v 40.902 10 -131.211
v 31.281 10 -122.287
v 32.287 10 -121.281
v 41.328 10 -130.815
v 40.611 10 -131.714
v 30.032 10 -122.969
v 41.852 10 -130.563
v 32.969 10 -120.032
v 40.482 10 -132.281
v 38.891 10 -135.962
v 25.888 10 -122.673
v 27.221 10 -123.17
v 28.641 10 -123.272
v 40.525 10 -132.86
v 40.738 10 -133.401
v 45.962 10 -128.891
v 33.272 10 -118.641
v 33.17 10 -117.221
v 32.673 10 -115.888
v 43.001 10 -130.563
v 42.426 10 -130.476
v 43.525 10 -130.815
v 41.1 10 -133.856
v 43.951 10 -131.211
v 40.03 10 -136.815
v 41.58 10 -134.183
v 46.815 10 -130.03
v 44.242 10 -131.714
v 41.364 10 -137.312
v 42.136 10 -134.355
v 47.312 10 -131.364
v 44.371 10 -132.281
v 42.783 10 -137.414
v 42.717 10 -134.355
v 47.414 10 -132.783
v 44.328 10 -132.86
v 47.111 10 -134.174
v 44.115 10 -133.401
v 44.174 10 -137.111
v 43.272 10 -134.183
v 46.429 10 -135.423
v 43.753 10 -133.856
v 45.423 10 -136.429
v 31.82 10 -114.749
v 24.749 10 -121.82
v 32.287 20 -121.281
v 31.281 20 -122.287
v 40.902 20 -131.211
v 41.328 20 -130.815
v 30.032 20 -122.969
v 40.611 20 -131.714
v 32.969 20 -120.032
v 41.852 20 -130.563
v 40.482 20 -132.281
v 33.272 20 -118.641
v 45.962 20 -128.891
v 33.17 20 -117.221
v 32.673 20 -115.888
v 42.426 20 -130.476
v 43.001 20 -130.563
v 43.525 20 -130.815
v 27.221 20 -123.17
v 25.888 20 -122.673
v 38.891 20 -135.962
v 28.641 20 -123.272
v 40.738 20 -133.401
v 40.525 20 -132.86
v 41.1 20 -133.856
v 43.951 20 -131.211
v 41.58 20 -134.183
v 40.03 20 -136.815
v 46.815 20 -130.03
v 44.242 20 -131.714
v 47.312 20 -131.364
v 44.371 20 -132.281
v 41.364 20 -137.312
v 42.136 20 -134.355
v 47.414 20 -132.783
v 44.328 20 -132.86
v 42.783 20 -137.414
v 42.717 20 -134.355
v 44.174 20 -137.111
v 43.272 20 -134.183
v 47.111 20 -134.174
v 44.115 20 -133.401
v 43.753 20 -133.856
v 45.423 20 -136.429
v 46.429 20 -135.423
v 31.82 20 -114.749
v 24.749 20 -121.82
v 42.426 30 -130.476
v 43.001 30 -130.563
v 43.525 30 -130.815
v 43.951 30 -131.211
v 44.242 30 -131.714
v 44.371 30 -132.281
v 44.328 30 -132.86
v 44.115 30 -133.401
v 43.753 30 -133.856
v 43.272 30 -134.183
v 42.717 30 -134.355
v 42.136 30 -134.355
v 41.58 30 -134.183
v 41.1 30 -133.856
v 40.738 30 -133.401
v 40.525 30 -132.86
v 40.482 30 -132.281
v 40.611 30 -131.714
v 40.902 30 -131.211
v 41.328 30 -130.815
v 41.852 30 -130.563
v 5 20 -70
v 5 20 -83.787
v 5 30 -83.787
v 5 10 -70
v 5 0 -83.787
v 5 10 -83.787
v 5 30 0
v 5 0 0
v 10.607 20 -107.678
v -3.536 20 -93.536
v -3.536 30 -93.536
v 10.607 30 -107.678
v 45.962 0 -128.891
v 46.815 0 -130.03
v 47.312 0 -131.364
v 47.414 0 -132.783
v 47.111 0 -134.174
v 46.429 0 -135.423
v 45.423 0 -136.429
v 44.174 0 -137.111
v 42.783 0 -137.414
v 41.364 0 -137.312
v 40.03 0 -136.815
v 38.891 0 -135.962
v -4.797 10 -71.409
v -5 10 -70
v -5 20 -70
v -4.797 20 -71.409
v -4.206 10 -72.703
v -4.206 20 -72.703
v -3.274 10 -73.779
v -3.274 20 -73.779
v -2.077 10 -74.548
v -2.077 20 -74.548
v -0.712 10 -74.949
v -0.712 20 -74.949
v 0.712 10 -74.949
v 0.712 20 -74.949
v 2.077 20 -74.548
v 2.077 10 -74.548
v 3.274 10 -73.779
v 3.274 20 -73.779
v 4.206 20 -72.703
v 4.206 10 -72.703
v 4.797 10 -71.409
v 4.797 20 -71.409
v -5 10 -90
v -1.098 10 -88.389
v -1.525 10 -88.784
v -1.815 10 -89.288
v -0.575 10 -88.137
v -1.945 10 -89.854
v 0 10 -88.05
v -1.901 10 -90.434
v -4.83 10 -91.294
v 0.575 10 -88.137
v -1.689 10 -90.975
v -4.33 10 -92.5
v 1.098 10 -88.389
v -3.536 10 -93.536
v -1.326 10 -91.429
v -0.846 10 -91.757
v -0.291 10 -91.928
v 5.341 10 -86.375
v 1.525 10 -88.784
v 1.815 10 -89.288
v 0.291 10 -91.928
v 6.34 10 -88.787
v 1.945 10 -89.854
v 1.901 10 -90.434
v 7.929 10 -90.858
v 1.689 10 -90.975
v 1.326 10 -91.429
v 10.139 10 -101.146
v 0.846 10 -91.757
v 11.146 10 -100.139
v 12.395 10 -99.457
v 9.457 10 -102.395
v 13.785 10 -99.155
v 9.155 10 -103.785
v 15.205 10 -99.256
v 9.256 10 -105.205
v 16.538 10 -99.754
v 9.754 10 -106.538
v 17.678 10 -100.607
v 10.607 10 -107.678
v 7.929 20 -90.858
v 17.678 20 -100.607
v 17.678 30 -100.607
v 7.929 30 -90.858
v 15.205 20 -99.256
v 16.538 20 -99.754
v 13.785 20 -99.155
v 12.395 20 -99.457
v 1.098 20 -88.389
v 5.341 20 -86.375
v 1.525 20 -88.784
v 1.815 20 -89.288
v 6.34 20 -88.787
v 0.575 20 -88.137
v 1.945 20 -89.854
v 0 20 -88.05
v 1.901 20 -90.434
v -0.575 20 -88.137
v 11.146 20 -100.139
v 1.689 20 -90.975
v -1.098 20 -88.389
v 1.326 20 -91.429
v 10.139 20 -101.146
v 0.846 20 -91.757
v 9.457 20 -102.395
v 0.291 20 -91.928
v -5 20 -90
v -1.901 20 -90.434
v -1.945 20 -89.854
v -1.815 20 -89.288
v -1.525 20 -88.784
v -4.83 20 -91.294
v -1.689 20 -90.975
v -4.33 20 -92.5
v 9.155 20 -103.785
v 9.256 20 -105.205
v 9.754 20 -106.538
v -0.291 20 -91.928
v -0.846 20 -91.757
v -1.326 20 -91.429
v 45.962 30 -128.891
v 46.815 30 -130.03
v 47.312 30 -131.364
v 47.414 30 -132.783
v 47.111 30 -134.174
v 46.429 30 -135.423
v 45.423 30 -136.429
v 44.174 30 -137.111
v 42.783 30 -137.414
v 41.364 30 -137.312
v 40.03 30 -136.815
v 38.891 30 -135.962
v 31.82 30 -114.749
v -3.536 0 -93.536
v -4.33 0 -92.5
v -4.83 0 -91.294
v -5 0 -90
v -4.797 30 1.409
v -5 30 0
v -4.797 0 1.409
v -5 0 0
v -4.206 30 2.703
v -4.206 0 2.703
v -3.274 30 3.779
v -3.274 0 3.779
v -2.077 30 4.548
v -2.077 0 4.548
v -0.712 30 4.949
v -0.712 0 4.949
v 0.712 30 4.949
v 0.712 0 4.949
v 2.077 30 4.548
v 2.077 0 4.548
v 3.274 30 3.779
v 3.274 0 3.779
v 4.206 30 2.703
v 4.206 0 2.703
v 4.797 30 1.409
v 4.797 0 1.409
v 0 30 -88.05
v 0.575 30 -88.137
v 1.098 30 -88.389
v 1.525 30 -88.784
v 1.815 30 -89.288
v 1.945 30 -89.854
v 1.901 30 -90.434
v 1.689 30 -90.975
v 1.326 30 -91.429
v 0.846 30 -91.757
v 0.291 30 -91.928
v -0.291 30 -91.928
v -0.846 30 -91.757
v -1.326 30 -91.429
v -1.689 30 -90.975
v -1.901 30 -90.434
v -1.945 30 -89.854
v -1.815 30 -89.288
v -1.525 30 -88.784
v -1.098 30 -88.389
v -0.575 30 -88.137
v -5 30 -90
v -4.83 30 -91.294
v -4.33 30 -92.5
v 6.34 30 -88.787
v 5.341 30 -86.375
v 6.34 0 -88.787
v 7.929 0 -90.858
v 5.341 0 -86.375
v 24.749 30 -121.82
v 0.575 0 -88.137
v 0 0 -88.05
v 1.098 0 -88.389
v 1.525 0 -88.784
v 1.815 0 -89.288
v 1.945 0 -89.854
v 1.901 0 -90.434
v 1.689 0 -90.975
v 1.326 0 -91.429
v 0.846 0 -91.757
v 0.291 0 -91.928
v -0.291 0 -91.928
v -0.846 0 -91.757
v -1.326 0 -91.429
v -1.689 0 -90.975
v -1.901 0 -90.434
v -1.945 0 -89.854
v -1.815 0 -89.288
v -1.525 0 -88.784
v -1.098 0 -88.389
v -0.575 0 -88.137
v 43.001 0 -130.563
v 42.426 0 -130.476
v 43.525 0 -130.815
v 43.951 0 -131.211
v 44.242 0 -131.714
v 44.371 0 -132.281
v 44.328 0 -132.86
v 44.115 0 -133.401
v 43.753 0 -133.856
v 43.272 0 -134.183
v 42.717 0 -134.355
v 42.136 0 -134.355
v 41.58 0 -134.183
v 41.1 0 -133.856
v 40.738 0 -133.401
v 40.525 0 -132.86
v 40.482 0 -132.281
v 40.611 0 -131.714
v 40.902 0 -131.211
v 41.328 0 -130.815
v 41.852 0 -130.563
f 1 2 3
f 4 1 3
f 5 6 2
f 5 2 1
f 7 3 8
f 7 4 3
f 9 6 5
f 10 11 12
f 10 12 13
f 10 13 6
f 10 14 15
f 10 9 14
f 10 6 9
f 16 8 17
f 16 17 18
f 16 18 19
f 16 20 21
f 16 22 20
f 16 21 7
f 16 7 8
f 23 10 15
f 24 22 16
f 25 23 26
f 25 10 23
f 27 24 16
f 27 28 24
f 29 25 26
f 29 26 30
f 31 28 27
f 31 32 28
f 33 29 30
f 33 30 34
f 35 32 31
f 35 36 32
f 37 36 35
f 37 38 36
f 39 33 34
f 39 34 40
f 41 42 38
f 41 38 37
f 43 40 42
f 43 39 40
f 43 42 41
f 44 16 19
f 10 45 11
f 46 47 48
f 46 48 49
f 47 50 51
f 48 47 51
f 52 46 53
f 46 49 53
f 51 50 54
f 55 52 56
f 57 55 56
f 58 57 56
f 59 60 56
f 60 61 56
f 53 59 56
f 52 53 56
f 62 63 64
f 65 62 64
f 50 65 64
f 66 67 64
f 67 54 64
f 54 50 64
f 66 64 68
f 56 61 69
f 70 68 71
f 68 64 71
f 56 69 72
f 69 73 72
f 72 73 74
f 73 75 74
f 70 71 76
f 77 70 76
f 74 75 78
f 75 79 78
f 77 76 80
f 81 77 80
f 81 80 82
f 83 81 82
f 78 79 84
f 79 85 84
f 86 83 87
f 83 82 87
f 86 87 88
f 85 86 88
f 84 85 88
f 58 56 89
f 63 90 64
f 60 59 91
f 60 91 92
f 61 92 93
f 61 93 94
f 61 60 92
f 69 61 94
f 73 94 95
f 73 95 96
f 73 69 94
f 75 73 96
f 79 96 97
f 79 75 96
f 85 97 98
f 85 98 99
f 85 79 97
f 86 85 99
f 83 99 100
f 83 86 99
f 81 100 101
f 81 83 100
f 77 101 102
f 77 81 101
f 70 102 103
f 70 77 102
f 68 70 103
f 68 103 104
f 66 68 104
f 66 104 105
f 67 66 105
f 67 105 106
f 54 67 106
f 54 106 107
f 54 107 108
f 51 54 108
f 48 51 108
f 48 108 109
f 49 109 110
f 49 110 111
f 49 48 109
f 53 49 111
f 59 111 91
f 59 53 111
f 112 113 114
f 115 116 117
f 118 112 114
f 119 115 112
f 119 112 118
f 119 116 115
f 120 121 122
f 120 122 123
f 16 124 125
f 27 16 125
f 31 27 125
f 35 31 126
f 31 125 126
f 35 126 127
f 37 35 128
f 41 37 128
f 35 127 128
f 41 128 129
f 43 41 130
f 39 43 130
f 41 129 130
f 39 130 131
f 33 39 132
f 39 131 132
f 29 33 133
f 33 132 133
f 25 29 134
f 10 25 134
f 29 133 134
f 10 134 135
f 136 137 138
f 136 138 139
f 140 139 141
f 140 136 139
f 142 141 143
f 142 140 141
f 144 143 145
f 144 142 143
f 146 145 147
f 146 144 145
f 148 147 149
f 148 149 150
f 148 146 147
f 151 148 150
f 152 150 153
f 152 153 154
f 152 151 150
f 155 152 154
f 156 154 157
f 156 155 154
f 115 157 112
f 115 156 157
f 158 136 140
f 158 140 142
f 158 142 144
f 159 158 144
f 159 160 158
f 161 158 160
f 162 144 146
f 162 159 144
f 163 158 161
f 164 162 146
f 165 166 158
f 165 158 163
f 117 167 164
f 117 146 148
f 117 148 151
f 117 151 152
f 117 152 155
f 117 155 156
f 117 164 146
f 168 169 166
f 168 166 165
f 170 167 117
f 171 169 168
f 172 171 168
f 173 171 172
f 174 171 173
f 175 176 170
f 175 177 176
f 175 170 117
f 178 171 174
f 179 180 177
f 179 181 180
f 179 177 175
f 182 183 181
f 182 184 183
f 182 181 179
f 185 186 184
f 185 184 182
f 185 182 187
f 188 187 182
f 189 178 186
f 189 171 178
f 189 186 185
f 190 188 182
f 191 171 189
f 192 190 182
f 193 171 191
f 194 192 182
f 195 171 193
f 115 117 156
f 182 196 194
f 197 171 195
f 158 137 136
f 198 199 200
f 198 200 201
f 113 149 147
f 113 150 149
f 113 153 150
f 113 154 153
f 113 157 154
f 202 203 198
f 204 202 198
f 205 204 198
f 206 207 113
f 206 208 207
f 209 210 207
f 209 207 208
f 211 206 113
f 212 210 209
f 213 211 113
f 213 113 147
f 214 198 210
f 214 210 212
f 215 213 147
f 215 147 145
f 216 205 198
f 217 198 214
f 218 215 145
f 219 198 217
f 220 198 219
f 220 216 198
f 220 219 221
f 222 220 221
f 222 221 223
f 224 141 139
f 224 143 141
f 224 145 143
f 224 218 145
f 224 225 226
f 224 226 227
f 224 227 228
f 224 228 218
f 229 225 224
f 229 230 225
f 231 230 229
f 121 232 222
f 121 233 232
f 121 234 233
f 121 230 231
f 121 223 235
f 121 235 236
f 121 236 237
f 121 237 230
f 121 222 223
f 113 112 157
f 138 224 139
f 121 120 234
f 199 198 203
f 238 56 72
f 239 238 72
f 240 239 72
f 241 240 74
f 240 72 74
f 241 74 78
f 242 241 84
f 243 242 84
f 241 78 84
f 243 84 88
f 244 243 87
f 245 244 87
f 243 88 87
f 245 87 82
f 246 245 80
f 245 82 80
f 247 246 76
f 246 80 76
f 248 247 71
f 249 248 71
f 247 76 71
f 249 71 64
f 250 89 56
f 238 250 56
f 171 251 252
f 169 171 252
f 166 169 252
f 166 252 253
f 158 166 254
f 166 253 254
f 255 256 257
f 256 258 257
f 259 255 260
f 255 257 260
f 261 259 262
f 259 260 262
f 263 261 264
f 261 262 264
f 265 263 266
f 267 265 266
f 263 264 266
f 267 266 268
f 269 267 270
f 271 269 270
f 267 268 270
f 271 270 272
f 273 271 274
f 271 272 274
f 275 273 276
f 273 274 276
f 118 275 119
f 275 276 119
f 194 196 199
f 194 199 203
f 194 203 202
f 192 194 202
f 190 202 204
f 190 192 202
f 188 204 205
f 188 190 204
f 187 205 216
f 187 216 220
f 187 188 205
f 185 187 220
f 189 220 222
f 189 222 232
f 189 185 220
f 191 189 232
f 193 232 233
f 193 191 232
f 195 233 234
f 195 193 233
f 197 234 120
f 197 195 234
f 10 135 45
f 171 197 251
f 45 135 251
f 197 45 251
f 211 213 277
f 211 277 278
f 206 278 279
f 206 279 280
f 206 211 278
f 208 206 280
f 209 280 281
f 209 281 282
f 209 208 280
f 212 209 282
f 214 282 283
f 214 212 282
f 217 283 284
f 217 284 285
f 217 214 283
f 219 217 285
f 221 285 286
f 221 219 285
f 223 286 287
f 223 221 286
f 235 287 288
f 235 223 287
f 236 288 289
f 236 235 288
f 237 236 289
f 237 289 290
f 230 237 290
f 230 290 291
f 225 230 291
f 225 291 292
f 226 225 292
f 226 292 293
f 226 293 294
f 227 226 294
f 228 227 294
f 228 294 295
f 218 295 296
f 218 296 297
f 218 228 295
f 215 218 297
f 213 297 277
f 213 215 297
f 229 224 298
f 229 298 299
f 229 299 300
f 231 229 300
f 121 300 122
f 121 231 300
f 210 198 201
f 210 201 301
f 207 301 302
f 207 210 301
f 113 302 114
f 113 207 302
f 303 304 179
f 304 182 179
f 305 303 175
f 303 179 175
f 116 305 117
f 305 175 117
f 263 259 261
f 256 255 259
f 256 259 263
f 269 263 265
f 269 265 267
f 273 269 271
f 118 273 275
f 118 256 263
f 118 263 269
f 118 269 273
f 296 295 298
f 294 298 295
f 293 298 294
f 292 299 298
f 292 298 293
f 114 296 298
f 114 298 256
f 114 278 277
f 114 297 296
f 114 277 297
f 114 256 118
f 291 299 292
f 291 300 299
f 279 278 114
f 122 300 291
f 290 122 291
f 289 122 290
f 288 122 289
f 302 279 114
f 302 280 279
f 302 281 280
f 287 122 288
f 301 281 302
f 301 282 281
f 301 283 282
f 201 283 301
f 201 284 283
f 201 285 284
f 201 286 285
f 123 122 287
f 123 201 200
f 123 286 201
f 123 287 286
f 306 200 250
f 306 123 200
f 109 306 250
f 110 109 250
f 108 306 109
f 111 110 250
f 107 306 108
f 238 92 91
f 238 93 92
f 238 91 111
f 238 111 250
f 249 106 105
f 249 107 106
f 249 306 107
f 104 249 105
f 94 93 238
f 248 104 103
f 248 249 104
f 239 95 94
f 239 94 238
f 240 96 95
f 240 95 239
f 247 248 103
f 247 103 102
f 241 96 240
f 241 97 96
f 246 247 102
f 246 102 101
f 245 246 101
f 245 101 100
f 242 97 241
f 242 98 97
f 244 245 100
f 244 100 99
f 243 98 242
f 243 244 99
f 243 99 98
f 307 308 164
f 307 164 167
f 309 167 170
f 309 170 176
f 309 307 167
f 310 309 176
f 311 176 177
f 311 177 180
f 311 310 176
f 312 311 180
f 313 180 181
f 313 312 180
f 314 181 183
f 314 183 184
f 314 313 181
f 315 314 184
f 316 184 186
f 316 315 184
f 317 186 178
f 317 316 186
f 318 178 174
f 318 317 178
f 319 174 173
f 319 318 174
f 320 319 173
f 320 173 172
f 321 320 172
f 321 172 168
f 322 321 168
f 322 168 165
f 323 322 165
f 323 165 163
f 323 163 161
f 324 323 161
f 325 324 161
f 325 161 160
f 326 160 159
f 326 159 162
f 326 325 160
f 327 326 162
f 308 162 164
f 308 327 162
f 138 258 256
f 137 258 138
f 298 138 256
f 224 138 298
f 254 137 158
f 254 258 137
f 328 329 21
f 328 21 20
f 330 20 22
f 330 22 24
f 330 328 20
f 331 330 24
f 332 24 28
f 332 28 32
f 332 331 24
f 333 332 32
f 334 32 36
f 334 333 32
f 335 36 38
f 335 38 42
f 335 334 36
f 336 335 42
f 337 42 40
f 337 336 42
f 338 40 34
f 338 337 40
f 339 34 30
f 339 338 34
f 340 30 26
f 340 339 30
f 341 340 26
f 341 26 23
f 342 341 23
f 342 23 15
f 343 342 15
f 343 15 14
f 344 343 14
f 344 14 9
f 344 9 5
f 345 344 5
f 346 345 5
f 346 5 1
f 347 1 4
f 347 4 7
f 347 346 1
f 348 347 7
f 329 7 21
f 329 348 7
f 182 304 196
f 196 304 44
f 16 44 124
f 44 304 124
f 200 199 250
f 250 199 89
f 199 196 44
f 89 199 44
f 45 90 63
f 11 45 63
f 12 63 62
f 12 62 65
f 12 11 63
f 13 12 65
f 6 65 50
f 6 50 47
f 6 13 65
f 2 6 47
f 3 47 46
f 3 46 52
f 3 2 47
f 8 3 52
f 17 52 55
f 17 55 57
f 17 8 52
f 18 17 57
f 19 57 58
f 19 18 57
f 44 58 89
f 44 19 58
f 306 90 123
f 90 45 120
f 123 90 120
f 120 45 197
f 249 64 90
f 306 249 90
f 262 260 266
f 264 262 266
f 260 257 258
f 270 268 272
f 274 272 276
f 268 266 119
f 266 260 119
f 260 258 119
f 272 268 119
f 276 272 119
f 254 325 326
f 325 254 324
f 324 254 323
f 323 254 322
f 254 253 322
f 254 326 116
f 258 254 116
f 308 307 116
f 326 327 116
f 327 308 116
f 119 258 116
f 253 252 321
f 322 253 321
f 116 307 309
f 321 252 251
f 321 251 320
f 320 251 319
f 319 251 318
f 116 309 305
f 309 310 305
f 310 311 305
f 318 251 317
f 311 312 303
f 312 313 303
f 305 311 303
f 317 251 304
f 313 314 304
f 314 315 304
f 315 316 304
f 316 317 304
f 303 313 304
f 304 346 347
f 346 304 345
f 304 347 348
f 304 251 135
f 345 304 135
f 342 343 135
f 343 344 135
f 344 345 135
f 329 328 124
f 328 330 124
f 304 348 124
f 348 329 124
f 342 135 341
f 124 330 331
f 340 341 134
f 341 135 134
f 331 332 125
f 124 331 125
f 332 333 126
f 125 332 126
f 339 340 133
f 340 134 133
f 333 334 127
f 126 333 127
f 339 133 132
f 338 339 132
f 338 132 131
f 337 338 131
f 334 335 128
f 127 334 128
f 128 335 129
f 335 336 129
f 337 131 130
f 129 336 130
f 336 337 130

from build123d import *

# Parameters (mm, degrees)
ESQUISSE2_R        = 1.95
BOSS_EXTRU_1_DEPTH = 10
CONG_1_R           = 10
BOSS_EXTRU_2_DEPTH = 10
ESQUISSE4_R        = 1.95
BOSS_EXTRU_3_DEPTH = 10


with BuildPart() as part:
    # Esquisse2 → Boss.-Extru.1 (new body)
    # profile 1 of 3: a face of its own
    with BuildSketch(Plane(origin=(0, 0, 0), x_dir=(1, 0, 0), z_dir=(0, 1, 0))):
        with BuildLine():
            Line((-5, 90), (-5, 0))
            ThreePointArc((-5, 0), (0, -5), (5, 0))
            Line((5, 0), (5, 87.928932188))
            Line((5, 87.928932188), (3.535533906, 86.464466094))
            ThreePointArc((3.535533906, 86.464466094), (-1.913417162, 85.380602337), (-5, 90))
        make_face()
    # profile 2 of 3: a face of its own
    with BuildSketch(Plane(origin=(0, 0, 0), x_dir=(1, 0, 0), z_dir=(0, 1, 0))):
        with BuildLine():
            Line((38.890872965, 135.961940777), (-3.535533906, 93.535533906))
            ThreePointArc((-3.535533906, 93.535533906), (1.913417162, 94.619397663), (5, 90))
            Line((5, 90), (5, 87.928932188))
            Line((5, 87.928932188), (45.961940777, 128.890872965))
            ThreePointArc((45.961940777, 128.890872965), (45.961940777, 135.961940777), (38.890872965, 135.961940777))
        make_face()
        with Locations(Location((42.426406871, 132.426406871, 0), (0, 0, 270))):
            Circle(ESQUISSE2_R, mode=Mode.SUBTRACT)
    # profile 3 of 3: a face of its own
    with BuildSketch(Plane(origin=(0, 0, 0), x_dir=(1, 0, 0), z_dir=(0, 1, 0))):
        with BuildLine():
            ThreePointArc((-3.535533906, 93.535533906), (-4.619397663, 91.913417162), (-5, 90))
            ThreePointArc((-5, 90), (-1.913417162, 85.380602337), (3.535533906, 86.464466094))
            Line((3.535533906, 86.464466094), (5, 87.928932188))
            Line((5, 87.928932188), (5, 90))
            ThreePointArc((5, 90), (1.913417162, 94.619397663), (-3.535533906, 93.535533906))
        make_face()
        with Locations(Location((0, 90, 0), (0, 0, 270))):
            Circle(ESQUISSE2_R, mode=Mode.SUBTRACT)
    extrude(amount=BOSS_EXTRU_1_DEPTH)

    # Congé1
    cong_1_edges = [part.edges().sort_by_distance(p)[0] for p in [
        (5, 5, -87.928932188),
    ]]
    fillet(cong_1_edges, radius=CONG_1_R)

    # Esquisse3 → Boss.-Extru.2 (add)
    with BuildSketch(Plane(origin=(0, 10, 0), x_dir=(1, 0, 0), z_dir=(0, 1, 0))):
        with BuildLine():
            Line((-5, 0), (-5, 70))
            ThreePointArc((-5, 70), (0, 75), (5, 70))
            Line((5, 70), (5, 0))
            ThreePointArc((5, 0), (0, -5), (-5, 0))
        make_face()
        with BuildLine():
            Line((31.819805153, 114.748737342), (17.67766953, 100.606601718))
            ThreePointArc((17.67766953, 100.606601718), (10.606601718, 100.606601718), (10.606601718, 107.67766953))
            Line((10.606601718, 107.67766953), (24.748737342, 121.819805153))
            ThreePointArc((24.748737342, 121.819805153), (31.819805153, 121.819805153), (31.819805153, 114.748737342))
        make_face()
    extrude(amount=BOSS_EXTRU_2_DEPTH)

    # Esquisse4 → Boss.-Extru.3 (add)
    # profile 1 of 4: a face of its own
    with BuildSketch(Plane(origin=(0, 20, 0), x_dir=(1, 0, 0), z_dir=(0, 1, 0))):
        with BuildLine():
            Line((31.819805153, 114.748737342), (45.961940777, 128.890872965))
            ThreePointArc((45.961940777, 128.890872965), (45.961940777, 135.961940777), (38.890872965, 135.961940777))
            Line((38.890872965, 135.961940777), (24.748737342, 121.819805153))
            ThreePointArc((24.748737342, 121.819805153), (31.819805153, 121.819805153), (31.819805153, 114.748737342))
        make_face()
        with Locations(Location((42.426406871, 132.426406871, 0), (0, 0, 270))):
            Circle(ESQUISSE4_R, mode=Mode.SUBTRACT)
    # profile 2 of 4: a face of its own
    with BuildSketch(Plane(origin=(0, 20, 0), x_dir=(1, 0, 0), z_dir=(0, 1, 0))):
        with BuildLine():
            Line((17.67766953, 100.606601718), (31.819805153, 114.748737342))
            ThreePointArc((31.819805153, 114.748737342), (31.819805153, 121.819805153), (24.748737342, 121.819805153))
            Line((24.748737342, 121.819805153), (10.606601718, 107.67766953))
            ThreePointArc((10.606601718, 107.67766953), (10.606601718, 100.606601718), (17.67766953, 100.606601718))
        make_face()
    # profile 3 of 4: a face of its own
    with BuildSketch(Plane(origin=(0, 20, 0), x_dir=(1, 0, 0), z_dir=(0, 1, 0))):
        with BuildLine():
            ThreePointArc((7.928932188, 90.857864376), (5.761204675, 87.613630888), (5, 83.786796564))
            Line((5, 83.786796564), (5, 70))
            ThreePointArc((5, 70), (0, 75), (-5, 70))
            Line((-5, 70), (-5, 90))
            ThreePointArc((-5, 90), (-4.619397663, 91.913417162), (-3.535533906, 93.535533906))
            Line((-3.535533906, 93.535533906), (10.606601718, 107.67766953))
            ThreePointArc((10.606601718, 107.67766953), (10.606601718, 100.606601718), (17.67766953, 100.606601718))
            Line((17.67766953, 100.606601718), (7.928932188, 90.857864376))
        make_face()
        with Locations(Location((0, 90, 0), (0, 0, 270))):
            Circle(ESQUISSE4_R, mode=Mode.SUBTRACT)
    # profile 4 of 4: a face of its own
    with BuildSketch(Plane(origin=(0, 20, 0), x_dir=(1, 0, 0), z_dir=(0, 1, 0))):
        with BuildLine():
            Line((-5, 70), (-5, 0))
            ThreePointArc((-5, 0), (0, -5), (5, 0))
            Line((5, 0), (5, 70))
            ThreePointArc((5, 70), (0, 75), (-5, 70))
        make_face()
    extrude(amount=BOSS_EXTRU_3_DEPTH)


solid = part.part
